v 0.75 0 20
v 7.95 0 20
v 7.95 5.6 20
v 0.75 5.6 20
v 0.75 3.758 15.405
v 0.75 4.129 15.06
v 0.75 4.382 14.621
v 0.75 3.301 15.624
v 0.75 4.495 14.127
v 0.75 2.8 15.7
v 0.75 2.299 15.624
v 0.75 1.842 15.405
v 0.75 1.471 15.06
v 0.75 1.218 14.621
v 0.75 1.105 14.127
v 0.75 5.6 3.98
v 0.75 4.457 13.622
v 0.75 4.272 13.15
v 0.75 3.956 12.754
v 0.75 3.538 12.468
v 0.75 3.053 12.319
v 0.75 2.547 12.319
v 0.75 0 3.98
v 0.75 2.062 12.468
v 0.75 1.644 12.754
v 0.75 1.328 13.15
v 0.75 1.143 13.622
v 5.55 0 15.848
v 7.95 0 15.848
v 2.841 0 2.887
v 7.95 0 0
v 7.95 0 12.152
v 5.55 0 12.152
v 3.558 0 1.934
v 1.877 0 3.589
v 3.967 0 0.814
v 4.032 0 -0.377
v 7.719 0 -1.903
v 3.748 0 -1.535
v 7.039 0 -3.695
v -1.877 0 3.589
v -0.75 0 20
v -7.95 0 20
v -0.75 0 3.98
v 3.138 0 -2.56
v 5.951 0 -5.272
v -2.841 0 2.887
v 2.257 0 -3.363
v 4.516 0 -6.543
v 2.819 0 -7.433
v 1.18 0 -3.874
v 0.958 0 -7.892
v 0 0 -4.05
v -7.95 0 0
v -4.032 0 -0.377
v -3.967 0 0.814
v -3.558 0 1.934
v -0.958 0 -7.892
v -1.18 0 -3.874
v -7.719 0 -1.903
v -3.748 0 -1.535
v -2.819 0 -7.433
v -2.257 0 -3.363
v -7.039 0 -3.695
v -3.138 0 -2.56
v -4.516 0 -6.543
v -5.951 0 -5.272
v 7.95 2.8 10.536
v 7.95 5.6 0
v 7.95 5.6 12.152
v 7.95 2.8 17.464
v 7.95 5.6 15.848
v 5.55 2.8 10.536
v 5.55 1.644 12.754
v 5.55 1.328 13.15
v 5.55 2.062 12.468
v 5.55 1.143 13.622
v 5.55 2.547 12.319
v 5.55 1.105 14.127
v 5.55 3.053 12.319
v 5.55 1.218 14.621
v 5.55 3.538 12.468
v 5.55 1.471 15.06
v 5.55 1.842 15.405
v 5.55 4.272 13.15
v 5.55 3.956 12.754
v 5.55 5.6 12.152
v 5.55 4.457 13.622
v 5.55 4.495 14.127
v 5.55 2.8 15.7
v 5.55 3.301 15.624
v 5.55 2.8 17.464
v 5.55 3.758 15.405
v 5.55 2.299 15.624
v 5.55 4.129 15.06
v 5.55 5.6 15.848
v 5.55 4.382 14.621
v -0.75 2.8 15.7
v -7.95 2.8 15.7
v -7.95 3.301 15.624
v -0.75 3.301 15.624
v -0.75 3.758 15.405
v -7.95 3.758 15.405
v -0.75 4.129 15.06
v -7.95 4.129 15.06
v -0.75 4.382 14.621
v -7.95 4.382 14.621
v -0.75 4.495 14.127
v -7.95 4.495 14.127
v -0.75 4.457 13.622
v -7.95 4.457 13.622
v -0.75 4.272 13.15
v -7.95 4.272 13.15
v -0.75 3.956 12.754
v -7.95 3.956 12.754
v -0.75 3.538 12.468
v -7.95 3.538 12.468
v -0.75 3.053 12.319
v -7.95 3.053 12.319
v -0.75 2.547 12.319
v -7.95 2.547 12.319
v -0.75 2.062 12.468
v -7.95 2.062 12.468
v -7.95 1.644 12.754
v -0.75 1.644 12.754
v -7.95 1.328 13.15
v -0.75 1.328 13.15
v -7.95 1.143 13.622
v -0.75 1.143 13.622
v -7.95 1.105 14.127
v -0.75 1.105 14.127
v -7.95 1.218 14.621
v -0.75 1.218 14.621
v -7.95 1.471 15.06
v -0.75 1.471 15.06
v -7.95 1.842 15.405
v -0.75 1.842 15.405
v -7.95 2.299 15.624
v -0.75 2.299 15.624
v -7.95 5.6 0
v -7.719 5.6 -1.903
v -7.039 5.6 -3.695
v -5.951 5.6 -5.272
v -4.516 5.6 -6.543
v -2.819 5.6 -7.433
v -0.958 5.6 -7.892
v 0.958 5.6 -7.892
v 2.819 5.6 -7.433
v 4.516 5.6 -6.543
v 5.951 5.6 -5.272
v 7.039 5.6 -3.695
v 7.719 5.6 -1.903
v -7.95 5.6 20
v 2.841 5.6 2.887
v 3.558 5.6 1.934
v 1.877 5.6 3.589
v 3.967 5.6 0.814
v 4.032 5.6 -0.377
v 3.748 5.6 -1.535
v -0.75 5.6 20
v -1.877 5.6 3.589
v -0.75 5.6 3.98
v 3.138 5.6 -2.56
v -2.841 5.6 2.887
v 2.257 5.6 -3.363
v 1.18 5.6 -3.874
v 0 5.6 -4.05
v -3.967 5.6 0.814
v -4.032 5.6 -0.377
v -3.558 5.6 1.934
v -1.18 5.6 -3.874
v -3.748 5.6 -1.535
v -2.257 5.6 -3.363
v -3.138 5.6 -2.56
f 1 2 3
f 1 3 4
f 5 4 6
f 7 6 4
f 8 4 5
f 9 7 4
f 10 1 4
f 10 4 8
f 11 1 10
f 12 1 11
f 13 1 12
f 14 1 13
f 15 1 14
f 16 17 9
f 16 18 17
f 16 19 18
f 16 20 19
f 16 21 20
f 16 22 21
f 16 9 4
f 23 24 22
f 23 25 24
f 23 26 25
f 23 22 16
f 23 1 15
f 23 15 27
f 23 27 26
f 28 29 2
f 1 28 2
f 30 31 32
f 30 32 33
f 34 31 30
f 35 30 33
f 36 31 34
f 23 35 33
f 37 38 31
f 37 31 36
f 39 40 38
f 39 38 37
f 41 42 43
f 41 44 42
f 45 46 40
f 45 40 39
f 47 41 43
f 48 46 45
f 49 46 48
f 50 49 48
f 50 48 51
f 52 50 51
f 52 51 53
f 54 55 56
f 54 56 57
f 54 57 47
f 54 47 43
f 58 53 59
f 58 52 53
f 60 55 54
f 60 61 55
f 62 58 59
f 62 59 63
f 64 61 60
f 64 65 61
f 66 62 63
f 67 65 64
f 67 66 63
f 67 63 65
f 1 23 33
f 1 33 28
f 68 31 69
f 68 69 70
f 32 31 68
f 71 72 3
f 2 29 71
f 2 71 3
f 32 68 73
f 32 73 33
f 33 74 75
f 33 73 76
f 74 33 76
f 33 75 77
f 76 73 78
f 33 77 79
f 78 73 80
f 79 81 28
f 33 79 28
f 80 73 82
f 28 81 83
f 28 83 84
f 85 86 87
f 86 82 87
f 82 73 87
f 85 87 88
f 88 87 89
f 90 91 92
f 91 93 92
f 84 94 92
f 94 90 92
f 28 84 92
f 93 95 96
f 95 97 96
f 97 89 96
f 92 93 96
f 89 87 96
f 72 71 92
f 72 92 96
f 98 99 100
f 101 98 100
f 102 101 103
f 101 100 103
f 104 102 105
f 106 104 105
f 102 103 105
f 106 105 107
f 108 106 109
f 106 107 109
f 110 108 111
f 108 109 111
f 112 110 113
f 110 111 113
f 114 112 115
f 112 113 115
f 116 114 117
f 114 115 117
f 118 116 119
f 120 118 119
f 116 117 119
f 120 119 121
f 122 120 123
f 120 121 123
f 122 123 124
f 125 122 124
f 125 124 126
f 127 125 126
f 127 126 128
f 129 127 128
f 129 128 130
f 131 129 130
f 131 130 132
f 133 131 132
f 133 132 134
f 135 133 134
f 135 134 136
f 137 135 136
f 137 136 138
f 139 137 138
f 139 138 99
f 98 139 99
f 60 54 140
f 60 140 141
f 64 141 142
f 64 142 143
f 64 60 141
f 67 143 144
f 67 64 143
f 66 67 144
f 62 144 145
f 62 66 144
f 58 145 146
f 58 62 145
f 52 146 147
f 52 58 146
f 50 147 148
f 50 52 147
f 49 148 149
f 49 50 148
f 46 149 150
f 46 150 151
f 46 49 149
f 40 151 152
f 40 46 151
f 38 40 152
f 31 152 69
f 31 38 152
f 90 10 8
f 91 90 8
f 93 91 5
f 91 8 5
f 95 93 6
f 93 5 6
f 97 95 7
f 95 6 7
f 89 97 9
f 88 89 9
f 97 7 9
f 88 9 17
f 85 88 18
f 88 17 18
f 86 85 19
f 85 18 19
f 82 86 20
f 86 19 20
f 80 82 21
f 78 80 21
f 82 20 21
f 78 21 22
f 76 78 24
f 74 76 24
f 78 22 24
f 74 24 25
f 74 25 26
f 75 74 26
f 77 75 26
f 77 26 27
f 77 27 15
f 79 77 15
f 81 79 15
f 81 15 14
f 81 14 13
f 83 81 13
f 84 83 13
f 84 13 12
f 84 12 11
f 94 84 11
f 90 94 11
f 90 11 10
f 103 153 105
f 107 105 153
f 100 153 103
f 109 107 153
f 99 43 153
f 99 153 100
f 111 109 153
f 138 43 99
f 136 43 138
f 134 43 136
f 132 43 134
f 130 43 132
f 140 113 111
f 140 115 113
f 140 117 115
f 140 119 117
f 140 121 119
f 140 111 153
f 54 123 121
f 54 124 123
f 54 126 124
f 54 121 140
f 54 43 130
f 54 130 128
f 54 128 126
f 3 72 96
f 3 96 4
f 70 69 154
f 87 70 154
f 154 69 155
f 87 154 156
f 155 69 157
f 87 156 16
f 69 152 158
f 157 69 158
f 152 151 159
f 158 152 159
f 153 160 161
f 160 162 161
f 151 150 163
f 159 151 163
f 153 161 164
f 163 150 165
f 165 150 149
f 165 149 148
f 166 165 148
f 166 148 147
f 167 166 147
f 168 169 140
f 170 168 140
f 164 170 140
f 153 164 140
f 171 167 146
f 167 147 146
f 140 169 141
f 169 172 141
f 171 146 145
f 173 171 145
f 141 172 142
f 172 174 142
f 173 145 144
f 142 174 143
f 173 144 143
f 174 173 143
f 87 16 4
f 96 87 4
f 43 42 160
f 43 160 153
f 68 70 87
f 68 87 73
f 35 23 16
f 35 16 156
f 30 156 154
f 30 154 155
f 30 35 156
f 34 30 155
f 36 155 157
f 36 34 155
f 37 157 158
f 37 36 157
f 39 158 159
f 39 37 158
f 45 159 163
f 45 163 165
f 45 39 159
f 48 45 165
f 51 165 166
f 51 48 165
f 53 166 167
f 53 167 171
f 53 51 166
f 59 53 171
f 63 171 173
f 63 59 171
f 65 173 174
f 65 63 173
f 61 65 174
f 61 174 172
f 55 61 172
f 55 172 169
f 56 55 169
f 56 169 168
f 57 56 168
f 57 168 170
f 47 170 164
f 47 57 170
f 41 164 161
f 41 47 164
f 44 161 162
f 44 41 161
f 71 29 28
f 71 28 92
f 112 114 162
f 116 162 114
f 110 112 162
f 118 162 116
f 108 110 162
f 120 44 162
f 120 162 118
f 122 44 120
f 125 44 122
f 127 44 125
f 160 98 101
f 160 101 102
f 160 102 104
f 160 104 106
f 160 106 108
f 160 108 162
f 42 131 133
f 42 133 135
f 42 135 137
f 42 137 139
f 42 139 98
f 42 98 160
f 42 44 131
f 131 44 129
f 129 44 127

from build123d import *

# Parameters (mm, degrees)
BOSS_EXTRUDE1_DEPTH = 5.6
SKETCH2_R           = 1.7
CUT_EXTRUDE1_DEPTH  = 16.9
CUT_EXTRUDE2_DEPTH  = 2.4


with BuildPart() as part:
    # Sketch1 → Boss-Extrude1 (new body)
    with BuildSketch(Plane(origin=(0, 0, 0), x_dir=(1, 0, 0), z_dir=(0, 1, 0))):
        with BuildLine():
            Line((-7.95, -20), (-7.95, 0))
            ThreePointArc((-7.95, 0), (0, 7.95), (7.95, 0))
            Line((7.95, 0), (7.95, -20))
            Line((7.95, -20), (0.75, -20))
            Line((0.75, -20), (0.75, -3.979949748))
            ThreePointArc((0.75, -3.979949748), (0, 4.05), (-0.75, -3.979949748))
            Line((-0.75, -3.979949748), (-0.75, -20))
            Line((-0.75, -20), (-7.95, -20))
        make_face()
    extrude(amount=BOSS_EXTRUDE1_DEPTH)

    # Sketch2 → Cut-Extrude1 (cut, through all)
    with BuildSketch(Plane.ZY.offset(7.95)):
        with Locations((14, 2.8)):
            Circle(SKETCH2_R)
    extrude(amount=-CUT_EXTRUDE1_DEPTH, mode=Mode.SUBTRACT)

    # Sketch4 → Cut-Extrude2 (cut)
    with BuildSketch(Plane(origin=(7.95, 0, 0), x_dir=(0, 0, -1), z_dir=(1, 0, 0))):
        Polygon((-17.464101615, 2.8), (-15.847520861, 5.6), (-12.152479139, 5.6), (-10.535898385, 2.8), (-12.152479139, 0), (-15.847520861, 0), align=None)
    extrude(amount=-CUT_EXTRUDE2_DEPTH, mode=Mode.SUBTRACT)


solid = part.part
